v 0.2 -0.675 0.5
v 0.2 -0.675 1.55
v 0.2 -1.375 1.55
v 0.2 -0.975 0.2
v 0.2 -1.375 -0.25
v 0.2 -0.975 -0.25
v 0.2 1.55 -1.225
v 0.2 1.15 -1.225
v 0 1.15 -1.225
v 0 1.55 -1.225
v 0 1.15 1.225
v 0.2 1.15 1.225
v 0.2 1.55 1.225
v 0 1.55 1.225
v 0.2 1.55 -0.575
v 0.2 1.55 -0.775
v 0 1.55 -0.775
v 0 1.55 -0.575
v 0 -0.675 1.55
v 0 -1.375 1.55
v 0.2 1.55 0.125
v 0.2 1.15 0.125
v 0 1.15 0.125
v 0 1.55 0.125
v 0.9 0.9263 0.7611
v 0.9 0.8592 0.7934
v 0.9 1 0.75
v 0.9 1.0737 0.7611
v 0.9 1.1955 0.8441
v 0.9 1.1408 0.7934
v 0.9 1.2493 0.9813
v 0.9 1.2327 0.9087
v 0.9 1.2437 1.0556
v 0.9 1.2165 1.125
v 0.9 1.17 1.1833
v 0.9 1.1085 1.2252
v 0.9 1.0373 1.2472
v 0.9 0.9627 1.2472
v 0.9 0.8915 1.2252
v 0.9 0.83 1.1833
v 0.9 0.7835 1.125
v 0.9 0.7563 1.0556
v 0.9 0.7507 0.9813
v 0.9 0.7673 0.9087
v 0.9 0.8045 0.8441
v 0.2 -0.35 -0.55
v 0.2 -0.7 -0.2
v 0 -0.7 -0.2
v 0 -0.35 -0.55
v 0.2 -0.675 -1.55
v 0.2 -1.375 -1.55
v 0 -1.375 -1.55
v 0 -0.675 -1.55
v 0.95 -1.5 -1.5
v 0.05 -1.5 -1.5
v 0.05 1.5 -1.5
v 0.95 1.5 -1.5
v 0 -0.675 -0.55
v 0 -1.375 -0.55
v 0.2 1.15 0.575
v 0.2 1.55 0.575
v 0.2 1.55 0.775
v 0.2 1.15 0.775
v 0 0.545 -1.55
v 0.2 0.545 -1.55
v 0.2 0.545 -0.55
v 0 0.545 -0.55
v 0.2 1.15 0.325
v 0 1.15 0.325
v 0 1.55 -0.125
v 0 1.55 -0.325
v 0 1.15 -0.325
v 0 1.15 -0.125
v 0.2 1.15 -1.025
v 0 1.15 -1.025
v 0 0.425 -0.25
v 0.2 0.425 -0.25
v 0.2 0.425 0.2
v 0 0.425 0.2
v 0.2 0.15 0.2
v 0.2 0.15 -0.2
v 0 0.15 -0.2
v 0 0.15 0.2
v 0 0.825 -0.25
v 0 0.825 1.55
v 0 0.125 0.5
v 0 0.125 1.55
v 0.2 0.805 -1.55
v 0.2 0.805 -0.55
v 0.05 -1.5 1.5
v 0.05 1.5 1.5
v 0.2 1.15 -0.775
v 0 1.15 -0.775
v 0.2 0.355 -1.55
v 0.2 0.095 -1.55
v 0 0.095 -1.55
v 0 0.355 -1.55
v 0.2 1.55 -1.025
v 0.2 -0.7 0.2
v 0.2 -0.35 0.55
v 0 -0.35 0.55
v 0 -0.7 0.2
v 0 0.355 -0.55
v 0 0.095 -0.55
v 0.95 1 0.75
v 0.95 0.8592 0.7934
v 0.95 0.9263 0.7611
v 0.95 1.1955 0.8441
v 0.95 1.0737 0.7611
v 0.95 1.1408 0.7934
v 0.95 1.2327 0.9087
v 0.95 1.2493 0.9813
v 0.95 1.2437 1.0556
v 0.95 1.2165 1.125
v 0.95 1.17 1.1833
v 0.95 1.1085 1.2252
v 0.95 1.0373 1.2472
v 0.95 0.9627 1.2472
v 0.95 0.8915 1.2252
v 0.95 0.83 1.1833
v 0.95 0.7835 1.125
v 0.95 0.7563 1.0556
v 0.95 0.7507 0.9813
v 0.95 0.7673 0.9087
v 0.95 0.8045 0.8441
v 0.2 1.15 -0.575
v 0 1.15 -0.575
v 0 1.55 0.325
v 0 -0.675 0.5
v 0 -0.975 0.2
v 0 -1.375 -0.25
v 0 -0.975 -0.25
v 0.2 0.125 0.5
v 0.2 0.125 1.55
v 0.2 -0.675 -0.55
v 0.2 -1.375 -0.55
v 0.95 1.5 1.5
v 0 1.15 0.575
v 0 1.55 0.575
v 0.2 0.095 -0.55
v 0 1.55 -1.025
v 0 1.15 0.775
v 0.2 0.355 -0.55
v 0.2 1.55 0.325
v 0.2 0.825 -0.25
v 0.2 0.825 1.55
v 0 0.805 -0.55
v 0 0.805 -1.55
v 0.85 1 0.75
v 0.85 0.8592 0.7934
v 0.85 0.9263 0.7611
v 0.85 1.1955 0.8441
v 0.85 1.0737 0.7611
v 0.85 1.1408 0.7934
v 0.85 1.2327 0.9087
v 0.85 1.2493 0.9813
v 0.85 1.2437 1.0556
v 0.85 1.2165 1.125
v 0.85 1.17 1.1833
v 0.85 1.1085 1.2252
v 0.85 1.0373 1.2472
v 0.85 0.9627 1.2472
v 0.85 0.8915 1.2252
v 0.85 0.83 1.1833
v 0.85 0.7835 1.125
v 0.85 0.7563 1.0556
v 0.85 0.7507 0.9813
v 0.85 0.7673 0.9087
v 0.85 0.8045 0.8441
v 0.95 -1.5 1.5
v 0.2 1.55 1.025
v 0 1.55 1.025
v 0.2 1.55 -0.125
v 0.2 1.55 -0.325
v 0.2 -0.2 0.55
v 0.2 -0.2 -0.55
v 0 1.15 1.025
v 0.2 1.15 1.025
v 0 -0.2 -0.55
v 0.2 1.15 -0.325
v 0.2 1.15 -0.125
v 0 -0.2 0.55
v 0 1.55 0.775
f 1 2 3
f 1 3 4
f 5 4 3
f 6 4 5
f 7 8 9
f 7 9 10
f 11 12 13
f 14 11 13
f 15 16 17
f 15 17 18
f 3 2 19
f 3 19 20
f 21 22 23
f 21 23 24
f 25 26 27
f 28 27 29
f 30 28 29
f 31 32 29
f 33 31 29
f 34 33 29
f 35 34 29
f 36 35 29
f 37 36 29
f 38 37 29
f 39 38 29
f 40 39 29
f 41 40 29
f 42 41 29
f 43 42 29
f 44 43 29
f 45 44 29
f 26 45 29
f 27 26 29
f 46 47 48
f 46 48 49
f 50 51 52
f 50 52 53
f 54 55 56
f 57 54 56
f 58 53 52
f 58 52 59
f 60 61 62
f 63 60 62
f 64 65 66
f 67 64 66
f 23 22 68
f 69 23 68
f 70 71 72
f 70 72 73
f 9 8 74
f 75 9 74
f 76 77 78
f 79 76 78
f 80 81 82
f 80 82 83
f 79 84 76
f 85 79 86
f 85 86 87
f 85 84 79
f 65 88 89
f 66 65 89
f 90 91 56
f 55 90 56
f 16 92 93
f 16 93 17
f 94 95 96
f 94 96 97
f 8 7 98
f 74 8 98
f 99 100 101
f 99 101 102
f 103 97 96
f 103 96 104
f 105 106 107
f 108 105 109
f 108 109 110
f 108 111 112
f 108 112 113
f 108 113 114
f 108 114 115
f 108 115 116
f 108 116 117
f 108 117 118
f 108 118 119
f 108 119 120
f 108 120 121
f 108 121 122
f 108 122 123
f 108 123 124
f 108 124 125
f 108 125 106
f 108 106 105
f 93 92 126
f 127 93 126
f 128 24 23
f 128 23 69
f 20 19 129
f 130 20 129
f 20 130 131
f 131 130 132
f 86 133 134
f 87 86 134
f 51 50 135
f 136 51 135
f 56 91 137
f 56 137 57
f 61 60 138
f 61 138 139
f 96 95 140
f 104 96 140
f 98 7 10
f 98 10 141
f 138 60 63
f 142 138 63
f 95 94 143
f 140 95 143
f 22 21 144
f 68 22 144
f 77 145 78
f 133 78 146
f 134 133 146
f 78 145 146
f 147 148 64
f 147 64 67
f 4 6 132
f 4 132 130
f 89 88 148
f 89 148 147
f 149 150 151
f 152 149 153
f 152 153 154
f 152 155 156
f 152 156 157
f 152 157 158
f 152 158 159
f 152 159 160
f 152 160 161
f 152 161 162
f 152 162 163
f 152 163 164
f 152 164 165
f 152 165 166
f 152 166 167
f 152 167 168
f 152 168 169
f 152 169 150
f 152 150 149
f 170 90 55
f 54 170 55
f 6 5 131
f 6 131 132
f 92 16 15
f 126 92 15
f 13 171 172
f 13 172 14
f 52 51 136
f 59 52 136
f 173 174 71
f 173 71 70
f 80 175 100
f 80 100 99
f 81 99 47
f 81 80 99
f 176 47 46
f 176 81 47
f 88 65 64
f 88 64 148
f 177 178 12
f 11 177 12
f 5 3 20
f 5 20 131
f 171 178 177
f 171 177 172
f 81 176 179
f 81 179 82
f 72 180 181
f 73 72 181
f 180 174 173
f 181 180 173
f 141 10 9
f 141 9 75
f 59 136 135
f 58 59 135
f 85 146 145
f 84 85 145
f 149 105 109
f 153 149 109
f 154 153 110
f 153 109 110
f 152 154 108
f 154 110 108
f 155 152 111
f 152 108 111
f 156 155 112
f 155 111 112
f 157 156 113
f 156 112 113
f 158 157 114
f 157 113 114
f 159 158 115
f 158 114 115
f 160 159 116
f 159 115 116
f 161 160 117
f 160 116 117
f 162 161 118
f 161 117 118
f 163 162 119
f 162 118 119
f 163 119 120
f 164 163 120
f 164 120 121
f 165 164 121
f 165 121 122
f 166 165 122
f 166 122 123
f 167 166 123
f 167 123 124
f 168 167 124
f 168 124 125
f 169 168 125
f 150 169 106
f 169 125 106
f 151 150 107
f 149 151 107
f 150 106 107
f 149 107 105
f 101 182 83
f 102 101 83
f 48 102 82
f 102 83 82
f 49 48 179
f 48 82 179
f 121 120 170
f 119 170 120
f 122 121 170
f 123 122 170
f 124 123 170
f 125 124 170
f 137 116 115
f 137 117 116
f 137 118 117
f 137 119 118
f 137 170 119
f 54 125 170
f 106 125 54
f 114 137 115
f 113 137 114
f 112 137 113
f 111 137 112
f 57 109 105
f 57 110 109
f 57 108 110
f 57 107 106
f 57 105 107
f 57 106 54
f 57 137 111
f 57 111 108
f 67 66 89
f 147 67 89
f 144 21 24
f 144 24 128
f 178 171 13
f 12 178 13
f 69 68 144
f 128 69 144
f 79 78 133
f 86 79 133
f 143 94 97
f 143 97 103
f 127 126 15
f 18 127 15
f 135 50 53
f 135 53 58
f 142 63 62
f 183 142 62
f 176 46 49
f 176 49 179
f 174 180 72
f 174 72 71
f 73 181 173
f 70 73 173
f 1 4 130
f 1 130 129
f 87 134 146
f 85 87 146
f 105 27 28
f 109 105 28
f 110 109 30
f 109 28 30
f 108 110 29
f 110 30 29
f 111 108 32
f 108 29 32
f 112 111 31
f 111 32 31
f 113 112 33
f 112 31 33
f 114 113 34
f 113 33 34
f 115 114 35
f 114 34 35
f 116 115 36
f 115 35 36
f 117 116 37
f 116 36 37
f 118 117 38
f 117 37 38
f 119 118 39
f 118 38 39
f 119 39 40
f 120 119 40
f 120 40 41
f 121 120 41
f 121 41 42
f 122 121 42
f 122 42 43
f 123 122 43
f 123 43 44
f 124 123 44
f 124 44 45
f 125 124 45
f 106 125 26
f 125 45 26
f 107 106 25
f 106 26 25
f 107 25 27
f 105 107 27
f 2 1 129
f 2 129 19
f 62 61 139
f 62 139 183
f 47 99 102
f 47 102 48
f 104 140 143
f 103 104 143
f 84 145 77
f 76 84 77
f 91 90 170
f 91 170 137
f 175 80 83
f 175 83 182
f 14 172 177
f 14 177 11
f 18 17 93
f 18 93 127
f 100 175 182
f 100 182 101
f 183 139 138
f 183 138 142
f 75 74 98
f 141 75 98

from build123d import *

# Parameters (mm, degrees)
SKETCH_1_W              = 3
SKETCH_1_H              = 3
EXTRUDE_1_DEPTH         = 0.9
SKETCH_2_R              = 0.25
CUT_EXTRUDE_1_DEPTH     = 0.1
SKETCH_3_R              = 0.25
EXTRUDE_2_DEPTH         = 0.05
EXTRUDE_3_DEPTH         = 0.05
EXTRUDE_3_DEPTH_BACK    = 0.15
SKETCH_4_W              = 0.2
SKETCH_4_H              = 0.4
EXTRUDE_3_2_DEPTH       = 0.05
EXTRUDE_3_2_DEPTH_BACK  = 0.15
EXTRUDE_3_3_DEPTH       = 0.05
EXTRUDE_3_3_DEPTH_BACK  = 0.15
EXTRUDE_3_4_DEPTH       = 0.05
EXTRUDE_3_4_DEPTH_BACK  = 0.15
EXTRUDE_3_5_DEPTH       = 0.05
EXTRUDE_3_5_DEPTH_BACK  = 0.15
EXTRUDE_3_6_DEPTH       = 0.05
EXTRUDE_3_6_DEPTH_BACK  = 0.15
EXTRUDE_3_7_DEPTH       = 0.05
EXTRUDE_3_7_DEPTH_BACK  = 0.15
EXTRUDE_3_8_DEPTH       = 0.05
EXTRUDE_3_8_DEPTH_BACK  = 0.15
EXTRUDE_3_9_DEPTH       = 0.05
EXTRUDE_3_9_DEPTH_BACK  = 0.15
EXTRUDE_3_10_DEPTH      = 0.05
EXTRUDE_3_10_DEPTH_BACK = 0.15
SKETCH_4_W_2            = 1
SKETCH_4_H_2            = 0.26
EXTRUDE_3_11_DEPTH      = 0.05
EXTRUDE_3_11_DEPTH_BACK = 0.15
EXTRUDE_3_12_DEPTH      = 0.05
EXTRUDE_3_12_DEPTH_BACK = 0.15
SKETCH_4_H_3            = 0.7


with BuildPart() as part:
    # Эскиз1 → Бобышка-Вытянуть1 (new body)
    with BuildSketch(Plane(origin=(0.05, 0, 0), x_dir=(0, 0, -1), z_dir=(1, 0, 0))):
        Rectangle(SKETCH_1_W, SKETCH_1_H)
    extrude(amount=EXTRUDE_1_DEPTH)

    # Эскиз2 → Вырез-Вытянуть1 (cut)
    with BuildSketch(Plane(origin=(0.95, 0, 0), x_dir=(0, 0, -1), z_dir=(1, 0, 0))):
        with Locations((-1, 1)):
            Circle(SKETCH_2_R)
    extrude(amount=-CUT_EXTRUDE_1_DEPTH, mode=Mode.SUBTRACT)


with BuildPart() as body_2:
    # Эскиз3 → Бобышка-Вытянуть2 (new body)
    with BuildSketch(Plane(origin=(0.9, 0, 0), x_dir=(0, 0, -1), z_dir=(1, 0, 0))):
        with Locations((-1, 1)):
            Circle(SKETCH_3_R)
    extrude(amount=EXTRUDE_2_DEPTH)


with BuildPart() as body_3:
    # Эскиз4 → Бобышка-Вытянуть3 (new, two sides: drawn at the far end of the back side and taken through both)
    with BuildSketch(Plane.ZY.offset(-0.05).offset(-EXTRUDE_3_DEPTH_BACK)):
        with Locations((-1.125, 1.35)):
            Rectangle(SKETCH_4_W, SKETCH_4_H)
    extrude(amount=EXTRUDE_3_DEPTH + EXTRUDE_3_DEPTH_BACK)


with BuildPart() as body_4:
    # Эскиз4 → Extrude 3 2 (new, two sides: drawn at the far end of the back side and taken through both)
    with BuildSketch(Plane.ZY.offset(-0.05).offset(-EXTRUDE_3_2_DEPTH_BACK)):
        with Locations((-0.675, 1.35)):
            Rectangle(SKETCH_4_W, SKETCH_4_H)
    extrude(amount=EXTRUDE_3_2_DEPTH + EXTRUDE_3_2_DEPTH_BACK)


with BuildPart() as body_5:
    # Эскиз4 → Extrude 3 3 (new, two sides: drawn at the far end of the back side and taken through both)
    with BuildSketch(Plane.ZY.offset(-0.05).offset(-EXTRUDE_3_3_DEPTH_BACK)):
        with Locations((-0.225, 1.35)):
            Rectangle(SKETCH_4_W, SKETCH_4_H)
    extrude(amount=EXTRUDE_3_3_DEPTH + EXTRUDE_3_3_DEPTH_BACK)


with BuildPart() as body_6:
    # Эскиз4 → Extrude 3 4 (new, two sides: drawn at the far end of the back side and taken through both)
    with BuildSketch(Plane.ZY.offset(-0.05).offset(-EXTRUDE_3_4_DEPTH_BACK)):
        with Locations((0.225, 1.35)):
            Rectangle(SKETCH_4_W, SKETCH_4_H)
    extrude(amount=EXTRUDE_3_4_DEPTH + EXTRUDE_3_4_DEPTH_BACK)


with BuildPart() as body_7:
    # Эскиз4 → Extrude 3 5 (new, two sides: drawn at the far end of the back side and taken through both)
    with BuildSketch(Plane.ZY.offset(-0.05).offset(-EXTRUDE_3_5_DEPTH_BACK)):
        with Locations((0.675, 1.35)):
            Rectangle(SKETCH_4_W, SKETCH_4_H)
    extrude(amount=EXTRUDE_3_5_DEPTH + EXTRUDE_3_5_DEPTH_BACK)


with BuildPart() as body_8:
    # Эскиз4 → Extrude 3 6 (new, two sides: drawn at the far end of the back side and taken through both)
    with BuildSketch(Plane.ZY.offset(-0.05).offset(-EXTRUDE_3_6_DEPTH_BACK)):
        with Locations((1.125, 1.35)):
            Rectangle(SKETCH_4_W, SKETCH_4_H)
    extrude(amount=EXTRUDE_3_6_DEPTH + EXTRUDE_3_6_DEPTH_BACK)


with BuildPart() as body_9:
    # Эскиз4 → Extrude 3 7 (new, two sides: drawn at the far end of the back side and taken through both)
    with BuildSketch(Plane.ZY.offset(-0.05).offset(-EXTRUDE_3_7_DEPTH_BACK)):
        Polygon((1.55, 0.825), (-0.25, 0.825), (-0.25, 0.425), (0.2, 0.425), (0.5, 0.125), (1.55, 0.125), align=None)
    extrude(amount=EXTRUDE_3_7_DEPTH + EXTRUDE_3_7_DEPTH_BACK)


with BuildPart() as body_10:
    # Эскиз4 → Extrude 3 8 (new, two sides: drawn at the far end of the back side and taken through both)
    with BuildSketch(Plane.ZY.offset(-0.05).offset(-EXTRUDE_3_8_DEPTH_BACK)):
        Polygon((-0.2, 0.15), (0.2, 0.15), (0.55, -0.2), (0.55, -0.35), (0.2, -0.7), (-0.2, -0.7), (-0.55, -0.35), (-0.55, -0.2), align=None)
    extrude(amount=EXTRUDE_3_8_DEPTH + EXTRUDE_3_8_DEPTH_BACK)


with BuildPart() as body_11:
    # Эскиз4 → Extrude 3 9 (new, two sides: drawn at the far end of the back side and taken through both)
    with BuildSketch(Plane.ZY.offset(-0.05).offset(-EXTRUDE_3_9_DEPTH_BACK)):
        Polygon((1.55, -0.675), (1.55, -1.375), (-0.25, -1.375), (-0.25, -0.975), (0.2, -0.975), (0.5, -0.675), align=None)
    extrude(amount=EXTRUDE_3_9_DEPTH + EXTRUDE_3_9_DEPTH_BACK)


with BuildPart() as body_12:
    # Эскиз4 → Extrude 3 10 (new, two sides: drawn at the far end of the back side and taken through both)
    with BuildSketch(Plane.ZY.offset(-0.05).offset(-EXTRUDE_3_10_DEPTH_BACK)):
        with Locations((-1.05, 0.225)):
            Rectangle(SKETCH_4_W_2, SKETCH_4_H_2)
    extrude(amount=EXTRUDE_3_10_DEPTH + EXTRUDE_3_10_DEPTH_BACK)


with BuildPart() as body_13:
    # Эскиз4 → Extrude 3 11 (new, two sides: drawn at the far end of the back side and taken through both)
    with BuildSketch(Plane.ZY.offset(-0.05).offset(-EXTRUDE_3_11_DEPTH_BACK)):
        with Locations((-1.05, 0.675)):
            Rectangle(SKETCH_4_W_2, SKETCH_4_H_2)
    extrude(amount=EXTRUDE_3_11_DEPTH + EXTRUDE_3_11_DEPTH_BACK)


with BuildPart() as body_14:
    # Эскиз4 → Extrude 3 12 (new, two sides: drawn at the far end of the back side and taken through both)
    with BuildSketch(Plane.ZY.offset(-0.05).offset(-EXTRUDE_3_12_DEPTH_BACK)):
        with Locations((-1.05, -1.025)):
            Rectangle(SKETCH_4_W_2, SKETCH_4_H_3)
    extrude(amount=EXTRUDE_3_12_DEPTH + EXTRUDE_3_12_DEPTH_BACK)


solid = Compound([part.part, body_2.part, body_3.part, body_4.part, body_5.part, body_6.part, body_7.part, body_8.part, body_9.part, body_10.part, body_11.part, body_12.part, body_13.part, body_14.part])
